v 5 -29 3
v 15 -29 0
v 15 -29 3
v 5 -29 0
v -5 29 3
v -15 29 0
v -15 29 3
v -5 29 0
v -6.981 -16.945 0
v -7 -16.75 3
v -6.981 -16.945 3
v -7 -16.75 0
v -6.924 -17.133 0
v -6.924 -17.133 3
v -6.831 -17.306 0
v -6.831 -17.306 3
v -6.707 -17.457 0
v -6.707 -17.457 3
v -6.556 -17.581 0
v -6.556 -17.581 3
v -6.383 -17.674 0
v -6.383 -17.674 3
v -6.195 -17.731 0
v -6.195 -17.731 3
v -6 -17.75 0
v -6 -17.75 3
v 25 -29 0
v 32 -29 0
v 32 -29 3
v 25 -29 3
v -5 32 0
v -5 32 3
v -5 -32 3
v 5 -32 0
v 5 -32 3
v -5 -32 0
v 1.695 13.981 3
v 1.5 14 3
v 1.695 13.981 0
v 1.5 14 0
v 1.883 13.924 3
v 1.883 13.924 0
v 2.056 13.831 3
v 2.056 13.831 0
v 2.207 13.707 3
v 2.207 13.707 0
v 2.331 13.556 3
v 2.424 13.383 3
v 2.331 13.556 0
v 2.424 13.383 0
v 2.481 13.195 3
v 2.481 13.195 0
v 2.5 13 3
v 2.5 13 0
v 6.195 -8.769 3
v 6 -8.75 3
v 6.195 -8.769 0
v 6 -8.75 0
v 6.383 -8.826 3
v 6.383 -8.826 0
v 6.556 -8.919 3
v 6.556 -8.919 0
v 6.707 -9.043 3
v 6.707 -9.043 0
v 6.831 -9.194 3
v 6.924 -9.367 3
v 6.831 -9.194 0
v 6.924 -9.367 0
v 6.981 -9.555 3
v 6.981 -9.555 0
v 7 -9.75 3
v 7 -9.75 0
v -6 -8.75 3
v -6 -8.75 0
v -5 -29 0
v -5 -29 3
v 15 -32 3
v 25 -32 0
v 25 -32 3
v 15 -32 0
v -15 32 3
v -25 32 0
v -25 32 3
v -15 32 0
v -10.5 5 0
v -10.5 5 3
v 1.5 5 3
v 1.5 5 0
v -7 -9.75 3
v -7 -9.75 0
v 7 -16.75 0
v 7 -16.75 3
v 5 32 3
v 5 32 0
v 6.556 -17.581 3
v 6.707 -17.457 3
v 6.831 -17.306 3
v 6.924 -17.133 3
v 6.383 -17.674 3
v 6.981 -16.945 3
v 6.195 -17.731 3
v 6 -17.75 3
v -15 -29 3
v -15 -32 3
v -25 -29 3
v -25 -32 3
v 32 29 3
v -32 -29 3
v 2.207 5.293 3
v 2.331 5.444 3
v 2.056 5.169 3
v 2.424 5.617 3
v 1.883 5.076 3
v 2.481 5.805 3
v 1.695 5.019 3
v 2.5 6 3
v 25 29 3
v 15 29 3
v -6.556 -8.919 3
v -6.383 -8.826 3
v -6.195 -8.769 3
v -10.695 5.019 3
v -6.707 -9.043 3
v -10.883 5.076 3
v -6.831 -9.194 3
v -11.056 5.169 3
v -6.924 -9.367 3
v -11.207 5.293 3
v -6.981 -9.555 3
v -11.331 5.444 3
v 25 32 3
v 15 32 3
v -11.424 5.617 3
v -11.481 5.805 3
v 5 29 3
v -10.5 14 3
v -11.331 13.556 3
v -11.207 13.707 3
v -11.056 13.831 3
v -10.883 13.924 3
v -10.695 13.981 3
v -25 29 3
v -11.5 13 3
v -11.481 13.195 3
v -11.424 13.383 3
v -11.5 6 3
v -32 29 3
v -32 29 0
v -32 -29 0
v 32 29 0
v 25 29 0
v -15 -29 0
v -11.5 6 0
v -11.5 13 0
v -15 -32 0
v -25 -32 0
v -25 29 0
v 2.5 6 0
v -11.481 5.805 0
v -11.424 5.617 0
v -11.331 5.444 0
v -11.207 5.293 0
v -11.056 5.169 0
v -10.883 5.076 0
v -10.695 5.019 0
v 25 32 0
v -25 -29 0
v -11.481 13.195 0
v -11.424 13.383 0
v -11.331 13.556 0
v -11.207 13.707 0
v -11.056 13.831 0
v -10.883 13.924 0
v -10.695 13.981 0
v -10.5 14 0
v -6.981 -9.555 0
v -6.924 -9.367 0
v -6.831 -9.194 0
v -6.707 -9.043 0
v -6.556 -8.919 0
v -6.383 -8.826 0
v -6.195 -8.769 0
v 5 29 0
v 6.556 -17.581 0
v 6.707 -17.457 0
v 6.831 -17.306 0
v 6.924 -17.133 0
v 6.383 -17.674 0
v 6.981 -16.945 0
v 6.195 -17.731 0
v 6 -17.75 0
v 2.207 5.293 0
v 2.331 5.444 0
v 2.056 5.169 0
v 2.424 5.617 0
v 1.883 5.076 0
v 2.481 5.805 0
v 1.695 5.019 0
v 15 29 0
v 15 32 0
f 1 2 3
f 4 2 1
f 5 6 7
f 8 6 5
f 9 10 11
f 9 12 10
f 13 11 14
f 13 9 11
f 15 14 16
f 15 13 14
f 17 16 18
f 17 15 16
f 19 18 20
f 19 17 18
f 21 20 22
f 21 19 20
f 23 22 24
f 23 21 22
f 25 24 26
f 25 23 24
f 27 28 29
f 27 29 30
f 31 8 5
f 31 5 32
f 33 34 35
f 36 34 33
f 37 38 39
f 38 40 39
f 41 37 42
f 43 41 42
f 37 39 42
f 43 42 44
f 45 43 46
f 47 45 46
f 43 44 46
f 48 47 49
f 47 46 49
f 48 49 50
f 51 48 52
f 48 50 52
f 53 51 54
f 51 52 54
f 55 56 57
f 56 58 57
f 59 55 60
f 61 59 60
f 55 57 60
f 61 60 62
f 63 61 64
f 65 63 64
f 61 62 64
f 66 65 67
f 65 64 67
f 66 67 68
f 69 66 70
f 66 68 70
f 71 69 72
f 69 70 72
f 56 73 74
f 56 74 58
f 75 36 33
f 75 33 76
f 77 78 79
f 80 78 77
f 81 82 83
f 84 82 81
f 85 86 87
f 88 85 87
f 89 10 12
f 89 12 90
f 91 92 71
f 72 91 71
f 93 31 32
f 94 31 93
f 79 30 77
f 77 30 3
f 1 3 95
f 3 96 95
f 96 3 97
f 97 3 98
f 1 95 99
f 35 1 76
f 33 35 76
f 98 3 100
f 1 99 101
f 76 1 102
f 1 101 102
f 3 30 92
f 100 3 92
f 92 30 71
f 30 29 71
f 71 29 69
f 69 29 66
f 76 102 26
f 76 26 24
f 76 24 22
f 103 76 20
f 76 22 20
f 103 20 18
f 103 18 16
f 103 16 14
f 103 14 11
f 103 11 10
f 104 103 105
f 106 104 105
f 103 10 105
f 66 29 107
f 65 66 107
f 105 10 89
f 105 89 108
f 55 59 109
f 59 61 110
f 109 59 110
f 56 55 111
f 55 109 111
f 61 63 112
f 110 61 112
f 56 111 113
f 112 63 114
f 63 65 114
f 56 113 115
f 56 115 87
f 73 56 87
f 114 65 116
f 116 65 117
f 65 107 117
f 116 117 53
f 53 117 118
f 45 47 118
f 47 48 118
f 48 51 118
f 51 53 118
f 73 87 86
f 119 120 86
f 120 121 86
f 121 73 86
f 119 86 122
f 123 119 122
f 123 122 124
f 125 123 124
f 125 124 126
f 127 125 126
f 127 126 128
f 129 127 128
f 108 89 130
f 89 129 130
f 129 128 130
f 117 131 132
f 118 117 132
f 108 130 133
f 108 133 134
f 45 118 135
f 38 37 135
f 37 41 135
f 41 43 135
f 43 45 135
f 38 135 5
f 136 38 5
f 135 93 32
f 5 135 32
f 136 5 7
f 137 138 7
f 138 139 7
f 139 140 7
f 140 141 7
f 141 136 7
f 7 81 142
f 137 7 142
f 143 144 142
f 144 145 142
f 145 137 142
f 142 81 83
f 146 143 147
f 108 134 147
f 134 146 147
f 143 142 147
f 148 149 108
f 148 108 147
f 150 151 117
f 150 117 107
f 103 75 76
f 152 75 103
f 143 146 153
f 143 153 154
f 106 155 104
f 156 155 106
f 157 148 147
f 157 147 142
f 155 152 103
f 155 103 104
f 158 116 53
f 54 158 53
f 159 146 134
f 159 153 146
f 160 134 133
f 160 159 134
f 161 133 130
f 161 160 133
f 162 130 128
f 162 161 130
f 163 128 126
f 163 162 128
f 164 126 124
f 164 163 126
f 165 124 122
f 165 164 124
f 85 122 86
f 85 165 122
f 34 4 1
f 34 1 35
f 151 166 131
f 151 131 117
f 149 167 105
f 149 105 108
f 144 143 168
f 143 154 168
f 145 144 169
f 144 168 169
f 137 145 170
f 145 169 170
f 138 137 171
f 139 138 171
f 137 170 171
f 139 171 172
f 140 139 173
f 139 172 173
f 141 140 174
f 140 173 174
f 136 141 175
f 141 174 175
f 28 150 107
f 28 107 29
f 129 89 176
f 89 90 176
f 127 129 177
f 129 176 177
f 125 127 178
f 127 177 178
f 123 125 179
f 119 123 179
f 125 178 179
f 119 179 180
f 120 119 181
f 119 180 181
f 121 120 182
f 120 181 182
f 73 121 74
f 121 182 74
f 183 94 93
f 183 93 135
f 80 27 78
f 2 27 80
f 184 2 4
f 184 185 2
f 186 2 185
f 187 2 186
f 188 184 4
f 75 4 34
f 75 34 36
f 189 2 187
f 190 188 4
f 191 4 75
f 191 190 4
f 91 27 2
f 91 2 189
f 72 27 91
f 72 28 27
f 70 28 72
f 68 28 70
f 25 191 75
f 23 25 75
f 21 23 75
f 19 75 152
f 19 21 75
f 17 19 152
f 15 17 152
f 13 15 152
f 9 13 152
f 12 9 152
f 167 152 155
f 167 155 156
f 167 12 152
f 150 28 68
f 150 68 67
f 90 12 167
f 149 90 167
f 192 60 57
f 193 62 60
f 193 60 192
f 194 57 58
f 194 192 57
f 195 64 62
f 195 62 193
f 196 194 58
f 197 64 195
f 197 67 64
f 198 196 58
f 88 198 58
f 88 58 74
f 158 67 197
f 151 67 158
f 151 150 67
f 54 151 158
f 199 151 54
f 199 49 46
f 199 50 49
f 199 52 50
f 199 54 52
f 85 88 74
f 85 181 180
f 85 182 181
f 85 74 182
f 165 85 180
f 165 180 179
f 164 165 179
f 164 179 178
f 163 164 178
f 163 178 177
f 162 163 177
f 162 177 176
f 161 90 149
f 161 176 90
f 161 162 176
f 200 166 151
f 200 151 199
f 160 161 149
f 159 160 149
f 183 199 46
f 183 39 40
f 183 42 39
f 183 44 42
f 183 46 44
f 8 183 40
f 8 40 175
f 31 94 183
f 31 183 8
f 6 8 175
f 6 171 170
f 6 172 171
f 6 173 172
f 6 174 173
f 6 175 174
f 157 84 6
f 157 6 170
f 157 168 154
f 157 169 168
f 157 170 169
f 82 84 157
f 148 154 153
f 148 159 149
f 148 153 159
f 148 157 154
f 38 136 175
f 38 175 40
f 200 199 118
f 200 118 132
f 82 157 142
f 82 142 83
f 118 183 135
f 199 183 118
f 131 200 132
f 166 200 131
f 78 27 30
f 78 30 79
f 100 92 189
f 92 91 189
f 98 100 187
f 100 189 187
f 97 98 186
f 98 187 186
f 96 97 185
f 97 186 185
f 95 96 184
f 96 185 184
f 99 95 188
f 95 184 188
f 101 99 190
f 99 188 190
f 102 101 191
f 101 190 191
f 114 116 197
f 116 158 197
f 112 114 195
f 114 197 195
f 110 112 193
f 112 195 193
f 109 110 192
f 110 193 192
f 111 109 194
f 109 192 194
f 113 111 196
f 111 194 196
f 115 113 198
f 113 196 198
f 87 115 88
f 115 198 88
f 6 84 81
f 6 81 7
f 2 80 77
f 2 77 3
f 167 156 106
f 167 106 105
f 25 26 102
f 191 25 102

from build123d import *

# Parameters (mm, degrees)
SALIENTE_EXTRUIR1_DEPTH = 3
CROQUIS2_W              = 14
CROQUIS2_H              = 9
CORTAR_EXTRUIR1_DEPTH   = 3
REDONDEO1_R             = 1


with BuildPart() as part:
    # Croquis1 → Saliente-Extruir1 (new body)
    with BuildSketch(Plane.XY):
        Polygon((-32, 29), (-25, 29), (-25, 32), (-15, 32), (-15, 29), (-5, 29), (-5, 32), (5, 32), (5, 29), (15, 29), (15, 32), (25, 32), (25, 29), (32, 29), (32, -29), (25, -29), (25, -32), (15, -32), (15, -29), (5, -29), (5, -32), (-5, -32), (-5, -29), (-15, -29), (-15, -32), (-25, -32), (-25, -29), (-32, -29), align=None)
    extrude(amount=SALIENTE_EXTRUIR1_DEPTH)

    # Croquis2 → Cortar-Extruir1 (cut)
    with BuildSketch(Plane.XY.offset(3)):
        with Locations((0, -13.25)):
            Rectangle(CROQUIS2_W, CROQUIS2_H)
        with Locations((-4.5, 9.5)):
            Rectangle(CROQUIS2_W, CROQUIS2_H)
    extrude(amount=-CORTAR_EXTRUIR1_DEPTH, mode=Mode.SUBTRACT)

    # Redondeo1
    redondeo1_edges = [part.edges().sort_by_distance(p)[0] for p in [
        (7, -8.75, 1.5),
        (7, -17.75, 1.5),
        (-7, -17.75, 1.5),
        (-7, -8.75, 1.5),
        (2.5, 14, 1.5),
        (2.5, 5, 1.5),
        (-11.5, 5, 1.5),
        (-11.5, 14, 1.5),
    ]]
    fillet(redondeo1_edges, radius=REDONDEO1_R)


solid = part.part
